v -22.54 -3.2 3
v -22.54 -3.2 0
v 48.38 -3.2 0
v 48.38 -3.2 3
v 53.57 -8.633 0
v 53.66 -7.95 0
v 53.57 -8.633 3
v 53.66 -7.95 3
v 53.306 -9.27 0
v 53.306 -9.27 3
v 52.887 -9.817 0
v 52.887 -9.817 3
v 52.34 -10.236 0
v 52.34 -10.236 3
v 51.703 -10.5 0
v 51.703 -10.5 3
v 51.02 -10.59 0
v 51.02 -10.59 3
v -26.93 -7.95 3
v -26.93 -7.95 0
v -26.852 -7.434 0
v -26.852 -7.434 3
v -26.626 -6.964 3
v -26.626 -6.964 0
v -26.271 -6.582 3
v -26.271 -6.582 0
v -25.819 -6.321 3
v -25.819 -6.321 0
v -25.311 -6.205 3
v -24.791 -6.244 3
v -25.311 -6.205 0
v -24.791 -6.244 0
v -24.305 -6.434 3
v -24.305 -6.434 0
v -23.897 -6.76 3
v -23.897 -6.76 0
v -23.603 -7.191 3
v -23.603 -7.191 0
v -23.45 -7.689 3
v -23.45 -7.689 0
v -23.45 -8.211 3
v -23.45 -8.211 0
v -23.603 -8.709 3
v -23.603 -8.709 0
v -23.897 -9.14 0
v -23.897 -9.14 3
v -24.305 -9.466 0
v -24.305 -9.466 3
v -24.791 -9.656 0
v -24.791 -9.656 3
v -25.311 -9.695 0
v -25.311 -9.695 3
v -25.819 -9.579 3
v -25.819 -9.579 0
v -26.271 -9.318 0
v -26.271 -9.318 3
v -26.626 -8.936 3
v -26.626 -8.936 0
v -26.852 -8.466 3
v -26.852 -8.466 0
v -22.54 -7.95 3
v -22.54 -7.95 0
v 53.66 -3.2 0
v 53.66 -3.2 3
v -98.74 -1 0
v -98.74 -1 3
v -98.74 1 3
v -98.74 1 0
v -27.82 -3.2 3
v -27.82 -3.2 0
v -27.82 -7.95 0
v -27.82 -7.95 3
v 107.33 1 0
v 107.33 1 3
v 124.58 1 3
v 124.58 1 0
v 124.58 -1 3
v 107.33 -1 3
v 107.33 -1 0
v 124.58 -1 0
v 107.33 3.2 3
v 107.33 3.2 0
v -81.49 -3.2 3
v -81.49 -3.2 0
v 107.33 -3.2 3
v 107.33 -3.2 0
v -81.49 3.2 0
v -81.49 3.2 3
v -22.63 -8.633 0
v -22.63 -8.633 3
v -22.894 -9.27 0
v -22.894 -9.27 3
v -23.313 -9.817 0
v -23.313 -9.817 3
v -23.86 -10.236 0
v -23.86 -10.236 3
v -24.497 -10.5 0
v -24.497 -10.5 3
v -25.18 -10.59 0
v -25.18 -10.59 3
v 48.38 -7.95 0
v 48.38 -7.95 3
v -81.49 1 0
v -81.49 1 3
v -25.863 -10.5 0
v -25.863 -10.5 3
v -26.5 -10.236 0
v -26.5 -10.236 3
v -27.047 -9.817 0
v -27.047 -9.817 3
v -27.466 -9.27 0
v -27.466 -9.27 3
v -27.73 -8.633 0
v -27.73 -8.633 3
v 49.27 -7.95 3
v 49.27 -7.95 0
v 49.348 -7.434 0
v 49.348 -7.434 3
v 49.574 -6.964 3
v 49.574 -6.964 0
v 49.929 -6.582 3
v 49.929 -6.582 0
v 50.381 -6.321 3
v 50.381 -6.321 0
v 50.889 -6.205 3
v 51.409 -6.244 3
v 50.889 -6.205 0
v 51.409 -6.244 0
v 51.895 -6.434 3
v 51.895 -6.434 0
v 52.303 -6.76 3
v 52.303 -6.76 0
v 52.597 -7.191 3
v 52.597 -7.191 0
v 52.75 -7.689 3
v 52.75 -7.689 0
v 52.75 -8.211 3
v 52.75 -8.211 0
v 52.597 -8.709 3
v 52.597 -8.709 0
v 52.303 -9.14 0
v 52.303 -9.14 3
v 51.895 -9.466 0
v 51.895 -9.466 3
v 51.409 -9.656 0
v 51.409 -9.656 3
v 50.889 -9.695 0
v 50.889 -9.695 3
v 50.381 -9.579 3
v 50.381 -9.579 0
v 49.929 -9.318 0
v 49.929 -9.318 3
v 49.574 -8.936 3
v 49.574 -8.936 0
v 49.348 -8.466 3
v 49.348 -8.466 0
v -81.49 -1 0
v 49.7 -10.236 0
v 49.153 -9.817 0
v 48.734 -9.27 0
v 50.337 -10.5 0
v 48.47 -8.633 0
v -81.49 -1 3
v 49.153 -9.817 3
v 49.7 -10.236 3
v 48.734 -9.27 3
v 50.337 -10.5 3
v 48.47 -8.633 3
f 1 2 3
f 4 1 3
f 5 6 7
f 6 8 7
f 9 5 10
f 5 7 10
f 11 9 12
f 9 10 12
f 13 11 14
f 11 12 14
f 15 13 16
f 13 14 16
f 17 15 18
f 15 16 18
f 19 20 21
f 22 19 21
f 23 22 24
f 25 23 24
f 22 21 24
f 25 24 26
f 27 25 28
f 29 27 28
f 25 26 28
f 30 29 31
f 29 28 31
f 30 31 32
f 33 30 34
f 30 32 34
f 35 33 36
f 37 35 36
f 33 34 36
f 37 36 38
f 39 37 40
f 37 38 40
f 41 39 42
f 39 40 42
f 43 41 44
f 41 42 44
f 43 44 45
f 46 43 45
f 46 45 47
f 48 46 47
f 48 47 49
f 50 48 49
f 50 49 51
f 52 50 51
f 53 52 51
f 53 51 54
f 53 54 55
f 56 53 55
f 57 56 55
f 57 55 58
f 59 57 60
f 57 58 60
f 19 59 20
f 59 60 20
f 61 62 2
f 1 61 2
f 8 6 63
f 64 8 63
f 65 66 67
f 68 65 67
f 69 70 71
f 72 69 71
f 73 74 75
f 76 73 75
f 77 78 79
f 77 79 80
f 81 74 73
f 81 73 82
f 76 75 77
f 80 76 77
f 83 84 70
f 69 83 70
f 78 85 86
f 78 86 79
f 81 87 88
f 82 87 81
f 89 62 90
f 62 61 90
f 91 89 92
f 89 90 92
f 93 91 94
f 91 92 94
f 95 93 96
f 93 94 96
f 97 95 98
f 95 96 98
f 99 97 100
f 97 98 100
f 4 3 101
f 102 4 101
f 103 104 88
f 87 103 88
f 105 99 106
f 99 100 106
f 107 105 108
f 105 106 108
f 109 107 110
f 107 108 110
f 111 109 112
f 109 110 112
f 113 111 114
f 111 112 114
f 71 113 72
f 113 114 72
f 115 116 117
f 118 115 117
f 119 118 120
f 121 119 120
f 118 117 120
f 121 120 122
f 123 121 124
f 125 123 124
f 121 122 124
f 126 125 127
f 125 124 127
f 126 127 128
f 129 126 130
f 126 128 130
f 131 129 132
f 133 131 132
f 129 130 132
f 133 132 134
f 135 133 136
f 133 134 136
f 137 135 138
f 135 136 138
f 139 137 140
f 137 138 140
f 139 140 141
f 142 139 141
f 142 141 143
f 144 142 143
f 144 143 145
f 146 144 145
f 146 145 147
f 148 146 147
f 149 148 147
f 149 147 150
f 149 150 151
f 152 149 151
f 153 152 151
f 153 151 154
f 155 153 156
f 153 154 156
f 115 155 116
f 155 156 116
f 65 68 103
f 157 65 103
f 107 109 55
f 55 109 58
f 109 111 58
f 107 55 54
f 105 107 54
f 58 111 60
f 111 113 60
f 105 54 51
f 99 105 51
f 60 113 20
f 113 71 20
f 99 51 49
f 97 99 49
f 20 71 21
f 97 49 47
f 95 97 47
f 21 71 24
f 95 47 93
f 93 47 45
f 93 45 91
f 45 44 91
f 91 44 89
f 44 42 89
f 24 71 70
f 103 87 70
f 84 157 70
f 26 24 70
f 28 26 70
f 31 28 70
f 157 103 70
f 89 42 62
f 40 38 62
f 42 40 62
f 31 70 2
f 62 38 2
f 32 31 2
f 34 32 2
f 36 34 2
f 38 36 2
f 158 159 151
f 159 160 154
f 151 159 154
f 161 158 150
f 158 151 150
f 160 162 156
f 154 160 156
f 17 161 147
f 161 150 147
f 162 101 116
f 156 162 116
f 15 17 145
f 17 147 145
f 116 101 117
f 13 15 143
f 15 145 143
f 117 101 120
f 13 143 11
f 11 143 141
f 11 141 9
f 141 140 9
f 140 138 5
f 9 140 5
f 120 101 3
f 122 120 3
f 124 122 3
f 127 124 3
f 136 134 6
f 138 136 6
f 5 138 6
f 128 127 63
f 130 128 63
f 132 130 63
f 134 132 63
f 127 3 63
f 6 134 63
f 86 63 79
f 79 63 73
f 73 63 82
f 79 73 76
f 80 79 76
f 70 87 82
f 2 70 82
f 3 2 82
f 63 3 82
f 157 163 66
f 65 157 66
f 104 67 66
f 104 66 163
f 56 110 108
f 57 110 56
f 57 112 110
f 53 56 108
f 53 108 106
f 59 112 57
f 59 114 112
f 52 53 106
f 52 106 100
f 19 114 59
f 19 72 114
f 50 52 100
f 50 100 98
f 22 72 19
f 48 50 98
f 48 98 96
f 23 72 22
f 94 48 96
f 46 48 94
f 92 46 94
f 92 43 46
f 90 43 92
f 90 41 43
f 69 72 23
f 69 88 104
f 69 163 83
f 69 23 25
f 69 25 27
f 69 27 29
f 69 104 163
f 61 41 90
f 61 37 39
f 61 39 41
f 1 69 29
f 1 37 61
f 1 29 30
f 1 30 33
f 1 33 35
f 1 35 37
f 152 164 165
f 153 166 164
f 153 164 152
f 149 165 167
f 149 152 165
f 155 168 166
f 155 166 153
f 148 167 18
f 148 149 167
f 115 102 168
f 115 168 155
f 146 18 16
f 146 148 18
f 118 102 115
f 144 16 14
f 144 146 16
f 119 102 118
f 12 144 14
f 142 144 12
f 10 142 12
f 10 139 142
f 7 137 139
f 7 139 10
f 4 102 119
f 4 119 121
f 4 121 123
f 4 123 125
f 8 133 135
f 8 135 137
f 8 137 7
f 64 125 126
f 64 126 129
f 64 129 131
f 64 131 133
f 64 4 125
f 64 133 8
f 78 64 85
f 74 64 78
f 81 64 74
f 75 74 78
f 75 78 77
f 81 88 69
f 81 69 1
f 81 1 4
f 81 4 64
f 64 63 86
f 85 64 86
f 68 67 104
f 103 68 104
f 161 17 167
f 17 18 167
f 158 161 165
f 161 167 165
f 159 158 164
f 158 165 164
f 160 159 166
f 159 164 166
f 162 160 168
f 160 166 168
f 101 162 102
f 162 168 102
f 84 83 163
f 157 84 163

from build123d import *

# Parameters (mm, degrees)
F0_W     = 259.72
F0_H     = 6.4
F1_DEPTH = 3
F3_DEPTH = 3
F4_R     = 2.63999
F5_R     = 1.75
F5_W     = 17.25
F5_H     = 2.2
F6_DEPTH = 3.001
F7_W     = 31.12
F7_H     = 2
F8_DEPTH = 3.001


# Not quite as in the source:
# - a fillet or chamfer is up to 0.001 mm smaller than in the source, because OpenCascade refuses the exact size
# - ends of sketch curves that miss each other by under 0.0002 mm in the source are joined


with BuildPart() as f1:
    # F0 (on Top) → F1 (new body)
    with BuildSketch(Plane.XY):
        Rectangle(F0_W, F0_H)
    extrude(amount=F1_DEPTH)

    # F2 (on Top) → F3 (join)
    with BuildSketch(Plane.XY):
        with BuildLine():
            Line((129.86, -10.59), (129.86, -3.2))
            Line((129.86, -3.2), (124.58, -3.2))
            Line((124.58, -3.2), (124.58, -7.95))
            Line((124.58, -7.95), (125.47, -7.95))
            ThreePointArc((125.47, -7.95), (127.22, -6.2), (128.97, -7.95))
            ThreePointArc((128.97, -7.95), (128.4574368671, -9.1874368671), (127.22, -9.7))
            Line((127.22, -9.7), (127.22, -10.59))
            Line((127.22, -10.59), (129.86, -10.59))
        make_face()
        with BuildLine():
            Line((125.47, -7.95), (124.58, -7.95))
            Line((124.58, -7.95), (124.58, -10.59))
            Line((124.58, -10.59), (127.22, -10.59))
            Line((127.22, -10.59), (127.22, -9.7))
            ThreePointArc((127.22, -9.7), (125.9825631329, -9.1874368671), (125.47, -7.95))
        make_face()
        Polygon((53.66, -10.59), (53.66, -3.2), (48.38, -3.2), (48.38, -7.95), (48.38, -10.59), align=None)
        with BuildLine():
            ThreePointArc((52.77, -7.95), (51.02, -9.7), (49.27, -7.95))
            ThreePointArc((49.27, -7.95), (51.02, -6.2), (52.77, -7.95))
        make_face(mode=Mode.SUBTRACT)
        Polygon((-22.54, -3.2), (-27.82, -3.2), (-27.82, -7.95), (-27.82, -10.59), (-22.54, -10.59), align=None)
        with BuildLine():
            ThreePointArc((-23.43, -7.95), (-25.18, -9.7), (-26.93, -7.95))
            ThreePointArc((-26.93, -7.95), (-25.18, -6.2), (-23.43, -7.95))
        make_face(mode=Mode.SUBTRACT)
    extrude(amount=F3_DEPTH)

    # F4 (radius 2.64 in the source; OpenCascade refuses exactly that, so slightly less here)
    f4_edges = [f1.edges().sort_by_distance(p)[0] for p in [
        (48.38, -10.59, 1.5),
        (53.66, -10.59, 1.5),
        (124.58, -10.59, 1.5),
        (129.86, -10.59, 1.5),
        (-27.82, -10.59, 1.5),
        (-22.54, -10.59, 1.5),
    ]]
    fillet(f4_edges, radius=F4_R)

    # F5 (on face) → F6 (cut, through all)
    with BuildSketch(Plane.XY.offset(3)):
        with BuildLine():
            Line((124.58, 3.2), (124.58, 1))
            Line((124.58, 1), (124.58, -1))
            Line((124.58, -1), (124.58, -3.2))
            Line((124.58, -3.2), (124.58, -7.95001))
            ThreePointArc((124.58, -7.95001), (125.3532351687, -9.8167648313), (127.21999, -10.59))
            ThreePointArc((127.21999, -10.59), (129.0867648313, -9.8167648313), (129.86, -7.95001))
            Line((129.86, -7.95001), (129.86, 3.2))
            Line((129.86, 3.2), (124.58, 3.2))
        make_face()
        with Locations((127.22, -7.95)):
            Circle(F5_R, mode=Mode.SUBTRACT)
        with Locations((115.955, 2.1)):
            Rectangle(F5_W, F5_H)
        with Locations((115.955, -2.1)):
            Rectangle(F5_W, F5_H)
    extrude(amount=-F6_DEPTH, mode=Mode.SUBTRACT)

    # F7 (on face) → F8 (cut, through all)
    with BuildSketch(Plane.XY.offset(3)):
        Polygon((-129.86, 3.2), (-129.86, 1), (-98.74, 1), (-81.49, 1), (-81.49, 3.2), align=None)
        Polygon((-129.86, -1), (-129.86, -3.2), (-81.49, -3.2), (-81.49, -1), (-98.74, -1), align=None)
        with Locations((-114.3, 0)):
            Rectangle(F7_W, F7_H)
    extrude(amount=-F8_DEPTH, mode=Mode.SUBTRACT)


solid = f1.part
